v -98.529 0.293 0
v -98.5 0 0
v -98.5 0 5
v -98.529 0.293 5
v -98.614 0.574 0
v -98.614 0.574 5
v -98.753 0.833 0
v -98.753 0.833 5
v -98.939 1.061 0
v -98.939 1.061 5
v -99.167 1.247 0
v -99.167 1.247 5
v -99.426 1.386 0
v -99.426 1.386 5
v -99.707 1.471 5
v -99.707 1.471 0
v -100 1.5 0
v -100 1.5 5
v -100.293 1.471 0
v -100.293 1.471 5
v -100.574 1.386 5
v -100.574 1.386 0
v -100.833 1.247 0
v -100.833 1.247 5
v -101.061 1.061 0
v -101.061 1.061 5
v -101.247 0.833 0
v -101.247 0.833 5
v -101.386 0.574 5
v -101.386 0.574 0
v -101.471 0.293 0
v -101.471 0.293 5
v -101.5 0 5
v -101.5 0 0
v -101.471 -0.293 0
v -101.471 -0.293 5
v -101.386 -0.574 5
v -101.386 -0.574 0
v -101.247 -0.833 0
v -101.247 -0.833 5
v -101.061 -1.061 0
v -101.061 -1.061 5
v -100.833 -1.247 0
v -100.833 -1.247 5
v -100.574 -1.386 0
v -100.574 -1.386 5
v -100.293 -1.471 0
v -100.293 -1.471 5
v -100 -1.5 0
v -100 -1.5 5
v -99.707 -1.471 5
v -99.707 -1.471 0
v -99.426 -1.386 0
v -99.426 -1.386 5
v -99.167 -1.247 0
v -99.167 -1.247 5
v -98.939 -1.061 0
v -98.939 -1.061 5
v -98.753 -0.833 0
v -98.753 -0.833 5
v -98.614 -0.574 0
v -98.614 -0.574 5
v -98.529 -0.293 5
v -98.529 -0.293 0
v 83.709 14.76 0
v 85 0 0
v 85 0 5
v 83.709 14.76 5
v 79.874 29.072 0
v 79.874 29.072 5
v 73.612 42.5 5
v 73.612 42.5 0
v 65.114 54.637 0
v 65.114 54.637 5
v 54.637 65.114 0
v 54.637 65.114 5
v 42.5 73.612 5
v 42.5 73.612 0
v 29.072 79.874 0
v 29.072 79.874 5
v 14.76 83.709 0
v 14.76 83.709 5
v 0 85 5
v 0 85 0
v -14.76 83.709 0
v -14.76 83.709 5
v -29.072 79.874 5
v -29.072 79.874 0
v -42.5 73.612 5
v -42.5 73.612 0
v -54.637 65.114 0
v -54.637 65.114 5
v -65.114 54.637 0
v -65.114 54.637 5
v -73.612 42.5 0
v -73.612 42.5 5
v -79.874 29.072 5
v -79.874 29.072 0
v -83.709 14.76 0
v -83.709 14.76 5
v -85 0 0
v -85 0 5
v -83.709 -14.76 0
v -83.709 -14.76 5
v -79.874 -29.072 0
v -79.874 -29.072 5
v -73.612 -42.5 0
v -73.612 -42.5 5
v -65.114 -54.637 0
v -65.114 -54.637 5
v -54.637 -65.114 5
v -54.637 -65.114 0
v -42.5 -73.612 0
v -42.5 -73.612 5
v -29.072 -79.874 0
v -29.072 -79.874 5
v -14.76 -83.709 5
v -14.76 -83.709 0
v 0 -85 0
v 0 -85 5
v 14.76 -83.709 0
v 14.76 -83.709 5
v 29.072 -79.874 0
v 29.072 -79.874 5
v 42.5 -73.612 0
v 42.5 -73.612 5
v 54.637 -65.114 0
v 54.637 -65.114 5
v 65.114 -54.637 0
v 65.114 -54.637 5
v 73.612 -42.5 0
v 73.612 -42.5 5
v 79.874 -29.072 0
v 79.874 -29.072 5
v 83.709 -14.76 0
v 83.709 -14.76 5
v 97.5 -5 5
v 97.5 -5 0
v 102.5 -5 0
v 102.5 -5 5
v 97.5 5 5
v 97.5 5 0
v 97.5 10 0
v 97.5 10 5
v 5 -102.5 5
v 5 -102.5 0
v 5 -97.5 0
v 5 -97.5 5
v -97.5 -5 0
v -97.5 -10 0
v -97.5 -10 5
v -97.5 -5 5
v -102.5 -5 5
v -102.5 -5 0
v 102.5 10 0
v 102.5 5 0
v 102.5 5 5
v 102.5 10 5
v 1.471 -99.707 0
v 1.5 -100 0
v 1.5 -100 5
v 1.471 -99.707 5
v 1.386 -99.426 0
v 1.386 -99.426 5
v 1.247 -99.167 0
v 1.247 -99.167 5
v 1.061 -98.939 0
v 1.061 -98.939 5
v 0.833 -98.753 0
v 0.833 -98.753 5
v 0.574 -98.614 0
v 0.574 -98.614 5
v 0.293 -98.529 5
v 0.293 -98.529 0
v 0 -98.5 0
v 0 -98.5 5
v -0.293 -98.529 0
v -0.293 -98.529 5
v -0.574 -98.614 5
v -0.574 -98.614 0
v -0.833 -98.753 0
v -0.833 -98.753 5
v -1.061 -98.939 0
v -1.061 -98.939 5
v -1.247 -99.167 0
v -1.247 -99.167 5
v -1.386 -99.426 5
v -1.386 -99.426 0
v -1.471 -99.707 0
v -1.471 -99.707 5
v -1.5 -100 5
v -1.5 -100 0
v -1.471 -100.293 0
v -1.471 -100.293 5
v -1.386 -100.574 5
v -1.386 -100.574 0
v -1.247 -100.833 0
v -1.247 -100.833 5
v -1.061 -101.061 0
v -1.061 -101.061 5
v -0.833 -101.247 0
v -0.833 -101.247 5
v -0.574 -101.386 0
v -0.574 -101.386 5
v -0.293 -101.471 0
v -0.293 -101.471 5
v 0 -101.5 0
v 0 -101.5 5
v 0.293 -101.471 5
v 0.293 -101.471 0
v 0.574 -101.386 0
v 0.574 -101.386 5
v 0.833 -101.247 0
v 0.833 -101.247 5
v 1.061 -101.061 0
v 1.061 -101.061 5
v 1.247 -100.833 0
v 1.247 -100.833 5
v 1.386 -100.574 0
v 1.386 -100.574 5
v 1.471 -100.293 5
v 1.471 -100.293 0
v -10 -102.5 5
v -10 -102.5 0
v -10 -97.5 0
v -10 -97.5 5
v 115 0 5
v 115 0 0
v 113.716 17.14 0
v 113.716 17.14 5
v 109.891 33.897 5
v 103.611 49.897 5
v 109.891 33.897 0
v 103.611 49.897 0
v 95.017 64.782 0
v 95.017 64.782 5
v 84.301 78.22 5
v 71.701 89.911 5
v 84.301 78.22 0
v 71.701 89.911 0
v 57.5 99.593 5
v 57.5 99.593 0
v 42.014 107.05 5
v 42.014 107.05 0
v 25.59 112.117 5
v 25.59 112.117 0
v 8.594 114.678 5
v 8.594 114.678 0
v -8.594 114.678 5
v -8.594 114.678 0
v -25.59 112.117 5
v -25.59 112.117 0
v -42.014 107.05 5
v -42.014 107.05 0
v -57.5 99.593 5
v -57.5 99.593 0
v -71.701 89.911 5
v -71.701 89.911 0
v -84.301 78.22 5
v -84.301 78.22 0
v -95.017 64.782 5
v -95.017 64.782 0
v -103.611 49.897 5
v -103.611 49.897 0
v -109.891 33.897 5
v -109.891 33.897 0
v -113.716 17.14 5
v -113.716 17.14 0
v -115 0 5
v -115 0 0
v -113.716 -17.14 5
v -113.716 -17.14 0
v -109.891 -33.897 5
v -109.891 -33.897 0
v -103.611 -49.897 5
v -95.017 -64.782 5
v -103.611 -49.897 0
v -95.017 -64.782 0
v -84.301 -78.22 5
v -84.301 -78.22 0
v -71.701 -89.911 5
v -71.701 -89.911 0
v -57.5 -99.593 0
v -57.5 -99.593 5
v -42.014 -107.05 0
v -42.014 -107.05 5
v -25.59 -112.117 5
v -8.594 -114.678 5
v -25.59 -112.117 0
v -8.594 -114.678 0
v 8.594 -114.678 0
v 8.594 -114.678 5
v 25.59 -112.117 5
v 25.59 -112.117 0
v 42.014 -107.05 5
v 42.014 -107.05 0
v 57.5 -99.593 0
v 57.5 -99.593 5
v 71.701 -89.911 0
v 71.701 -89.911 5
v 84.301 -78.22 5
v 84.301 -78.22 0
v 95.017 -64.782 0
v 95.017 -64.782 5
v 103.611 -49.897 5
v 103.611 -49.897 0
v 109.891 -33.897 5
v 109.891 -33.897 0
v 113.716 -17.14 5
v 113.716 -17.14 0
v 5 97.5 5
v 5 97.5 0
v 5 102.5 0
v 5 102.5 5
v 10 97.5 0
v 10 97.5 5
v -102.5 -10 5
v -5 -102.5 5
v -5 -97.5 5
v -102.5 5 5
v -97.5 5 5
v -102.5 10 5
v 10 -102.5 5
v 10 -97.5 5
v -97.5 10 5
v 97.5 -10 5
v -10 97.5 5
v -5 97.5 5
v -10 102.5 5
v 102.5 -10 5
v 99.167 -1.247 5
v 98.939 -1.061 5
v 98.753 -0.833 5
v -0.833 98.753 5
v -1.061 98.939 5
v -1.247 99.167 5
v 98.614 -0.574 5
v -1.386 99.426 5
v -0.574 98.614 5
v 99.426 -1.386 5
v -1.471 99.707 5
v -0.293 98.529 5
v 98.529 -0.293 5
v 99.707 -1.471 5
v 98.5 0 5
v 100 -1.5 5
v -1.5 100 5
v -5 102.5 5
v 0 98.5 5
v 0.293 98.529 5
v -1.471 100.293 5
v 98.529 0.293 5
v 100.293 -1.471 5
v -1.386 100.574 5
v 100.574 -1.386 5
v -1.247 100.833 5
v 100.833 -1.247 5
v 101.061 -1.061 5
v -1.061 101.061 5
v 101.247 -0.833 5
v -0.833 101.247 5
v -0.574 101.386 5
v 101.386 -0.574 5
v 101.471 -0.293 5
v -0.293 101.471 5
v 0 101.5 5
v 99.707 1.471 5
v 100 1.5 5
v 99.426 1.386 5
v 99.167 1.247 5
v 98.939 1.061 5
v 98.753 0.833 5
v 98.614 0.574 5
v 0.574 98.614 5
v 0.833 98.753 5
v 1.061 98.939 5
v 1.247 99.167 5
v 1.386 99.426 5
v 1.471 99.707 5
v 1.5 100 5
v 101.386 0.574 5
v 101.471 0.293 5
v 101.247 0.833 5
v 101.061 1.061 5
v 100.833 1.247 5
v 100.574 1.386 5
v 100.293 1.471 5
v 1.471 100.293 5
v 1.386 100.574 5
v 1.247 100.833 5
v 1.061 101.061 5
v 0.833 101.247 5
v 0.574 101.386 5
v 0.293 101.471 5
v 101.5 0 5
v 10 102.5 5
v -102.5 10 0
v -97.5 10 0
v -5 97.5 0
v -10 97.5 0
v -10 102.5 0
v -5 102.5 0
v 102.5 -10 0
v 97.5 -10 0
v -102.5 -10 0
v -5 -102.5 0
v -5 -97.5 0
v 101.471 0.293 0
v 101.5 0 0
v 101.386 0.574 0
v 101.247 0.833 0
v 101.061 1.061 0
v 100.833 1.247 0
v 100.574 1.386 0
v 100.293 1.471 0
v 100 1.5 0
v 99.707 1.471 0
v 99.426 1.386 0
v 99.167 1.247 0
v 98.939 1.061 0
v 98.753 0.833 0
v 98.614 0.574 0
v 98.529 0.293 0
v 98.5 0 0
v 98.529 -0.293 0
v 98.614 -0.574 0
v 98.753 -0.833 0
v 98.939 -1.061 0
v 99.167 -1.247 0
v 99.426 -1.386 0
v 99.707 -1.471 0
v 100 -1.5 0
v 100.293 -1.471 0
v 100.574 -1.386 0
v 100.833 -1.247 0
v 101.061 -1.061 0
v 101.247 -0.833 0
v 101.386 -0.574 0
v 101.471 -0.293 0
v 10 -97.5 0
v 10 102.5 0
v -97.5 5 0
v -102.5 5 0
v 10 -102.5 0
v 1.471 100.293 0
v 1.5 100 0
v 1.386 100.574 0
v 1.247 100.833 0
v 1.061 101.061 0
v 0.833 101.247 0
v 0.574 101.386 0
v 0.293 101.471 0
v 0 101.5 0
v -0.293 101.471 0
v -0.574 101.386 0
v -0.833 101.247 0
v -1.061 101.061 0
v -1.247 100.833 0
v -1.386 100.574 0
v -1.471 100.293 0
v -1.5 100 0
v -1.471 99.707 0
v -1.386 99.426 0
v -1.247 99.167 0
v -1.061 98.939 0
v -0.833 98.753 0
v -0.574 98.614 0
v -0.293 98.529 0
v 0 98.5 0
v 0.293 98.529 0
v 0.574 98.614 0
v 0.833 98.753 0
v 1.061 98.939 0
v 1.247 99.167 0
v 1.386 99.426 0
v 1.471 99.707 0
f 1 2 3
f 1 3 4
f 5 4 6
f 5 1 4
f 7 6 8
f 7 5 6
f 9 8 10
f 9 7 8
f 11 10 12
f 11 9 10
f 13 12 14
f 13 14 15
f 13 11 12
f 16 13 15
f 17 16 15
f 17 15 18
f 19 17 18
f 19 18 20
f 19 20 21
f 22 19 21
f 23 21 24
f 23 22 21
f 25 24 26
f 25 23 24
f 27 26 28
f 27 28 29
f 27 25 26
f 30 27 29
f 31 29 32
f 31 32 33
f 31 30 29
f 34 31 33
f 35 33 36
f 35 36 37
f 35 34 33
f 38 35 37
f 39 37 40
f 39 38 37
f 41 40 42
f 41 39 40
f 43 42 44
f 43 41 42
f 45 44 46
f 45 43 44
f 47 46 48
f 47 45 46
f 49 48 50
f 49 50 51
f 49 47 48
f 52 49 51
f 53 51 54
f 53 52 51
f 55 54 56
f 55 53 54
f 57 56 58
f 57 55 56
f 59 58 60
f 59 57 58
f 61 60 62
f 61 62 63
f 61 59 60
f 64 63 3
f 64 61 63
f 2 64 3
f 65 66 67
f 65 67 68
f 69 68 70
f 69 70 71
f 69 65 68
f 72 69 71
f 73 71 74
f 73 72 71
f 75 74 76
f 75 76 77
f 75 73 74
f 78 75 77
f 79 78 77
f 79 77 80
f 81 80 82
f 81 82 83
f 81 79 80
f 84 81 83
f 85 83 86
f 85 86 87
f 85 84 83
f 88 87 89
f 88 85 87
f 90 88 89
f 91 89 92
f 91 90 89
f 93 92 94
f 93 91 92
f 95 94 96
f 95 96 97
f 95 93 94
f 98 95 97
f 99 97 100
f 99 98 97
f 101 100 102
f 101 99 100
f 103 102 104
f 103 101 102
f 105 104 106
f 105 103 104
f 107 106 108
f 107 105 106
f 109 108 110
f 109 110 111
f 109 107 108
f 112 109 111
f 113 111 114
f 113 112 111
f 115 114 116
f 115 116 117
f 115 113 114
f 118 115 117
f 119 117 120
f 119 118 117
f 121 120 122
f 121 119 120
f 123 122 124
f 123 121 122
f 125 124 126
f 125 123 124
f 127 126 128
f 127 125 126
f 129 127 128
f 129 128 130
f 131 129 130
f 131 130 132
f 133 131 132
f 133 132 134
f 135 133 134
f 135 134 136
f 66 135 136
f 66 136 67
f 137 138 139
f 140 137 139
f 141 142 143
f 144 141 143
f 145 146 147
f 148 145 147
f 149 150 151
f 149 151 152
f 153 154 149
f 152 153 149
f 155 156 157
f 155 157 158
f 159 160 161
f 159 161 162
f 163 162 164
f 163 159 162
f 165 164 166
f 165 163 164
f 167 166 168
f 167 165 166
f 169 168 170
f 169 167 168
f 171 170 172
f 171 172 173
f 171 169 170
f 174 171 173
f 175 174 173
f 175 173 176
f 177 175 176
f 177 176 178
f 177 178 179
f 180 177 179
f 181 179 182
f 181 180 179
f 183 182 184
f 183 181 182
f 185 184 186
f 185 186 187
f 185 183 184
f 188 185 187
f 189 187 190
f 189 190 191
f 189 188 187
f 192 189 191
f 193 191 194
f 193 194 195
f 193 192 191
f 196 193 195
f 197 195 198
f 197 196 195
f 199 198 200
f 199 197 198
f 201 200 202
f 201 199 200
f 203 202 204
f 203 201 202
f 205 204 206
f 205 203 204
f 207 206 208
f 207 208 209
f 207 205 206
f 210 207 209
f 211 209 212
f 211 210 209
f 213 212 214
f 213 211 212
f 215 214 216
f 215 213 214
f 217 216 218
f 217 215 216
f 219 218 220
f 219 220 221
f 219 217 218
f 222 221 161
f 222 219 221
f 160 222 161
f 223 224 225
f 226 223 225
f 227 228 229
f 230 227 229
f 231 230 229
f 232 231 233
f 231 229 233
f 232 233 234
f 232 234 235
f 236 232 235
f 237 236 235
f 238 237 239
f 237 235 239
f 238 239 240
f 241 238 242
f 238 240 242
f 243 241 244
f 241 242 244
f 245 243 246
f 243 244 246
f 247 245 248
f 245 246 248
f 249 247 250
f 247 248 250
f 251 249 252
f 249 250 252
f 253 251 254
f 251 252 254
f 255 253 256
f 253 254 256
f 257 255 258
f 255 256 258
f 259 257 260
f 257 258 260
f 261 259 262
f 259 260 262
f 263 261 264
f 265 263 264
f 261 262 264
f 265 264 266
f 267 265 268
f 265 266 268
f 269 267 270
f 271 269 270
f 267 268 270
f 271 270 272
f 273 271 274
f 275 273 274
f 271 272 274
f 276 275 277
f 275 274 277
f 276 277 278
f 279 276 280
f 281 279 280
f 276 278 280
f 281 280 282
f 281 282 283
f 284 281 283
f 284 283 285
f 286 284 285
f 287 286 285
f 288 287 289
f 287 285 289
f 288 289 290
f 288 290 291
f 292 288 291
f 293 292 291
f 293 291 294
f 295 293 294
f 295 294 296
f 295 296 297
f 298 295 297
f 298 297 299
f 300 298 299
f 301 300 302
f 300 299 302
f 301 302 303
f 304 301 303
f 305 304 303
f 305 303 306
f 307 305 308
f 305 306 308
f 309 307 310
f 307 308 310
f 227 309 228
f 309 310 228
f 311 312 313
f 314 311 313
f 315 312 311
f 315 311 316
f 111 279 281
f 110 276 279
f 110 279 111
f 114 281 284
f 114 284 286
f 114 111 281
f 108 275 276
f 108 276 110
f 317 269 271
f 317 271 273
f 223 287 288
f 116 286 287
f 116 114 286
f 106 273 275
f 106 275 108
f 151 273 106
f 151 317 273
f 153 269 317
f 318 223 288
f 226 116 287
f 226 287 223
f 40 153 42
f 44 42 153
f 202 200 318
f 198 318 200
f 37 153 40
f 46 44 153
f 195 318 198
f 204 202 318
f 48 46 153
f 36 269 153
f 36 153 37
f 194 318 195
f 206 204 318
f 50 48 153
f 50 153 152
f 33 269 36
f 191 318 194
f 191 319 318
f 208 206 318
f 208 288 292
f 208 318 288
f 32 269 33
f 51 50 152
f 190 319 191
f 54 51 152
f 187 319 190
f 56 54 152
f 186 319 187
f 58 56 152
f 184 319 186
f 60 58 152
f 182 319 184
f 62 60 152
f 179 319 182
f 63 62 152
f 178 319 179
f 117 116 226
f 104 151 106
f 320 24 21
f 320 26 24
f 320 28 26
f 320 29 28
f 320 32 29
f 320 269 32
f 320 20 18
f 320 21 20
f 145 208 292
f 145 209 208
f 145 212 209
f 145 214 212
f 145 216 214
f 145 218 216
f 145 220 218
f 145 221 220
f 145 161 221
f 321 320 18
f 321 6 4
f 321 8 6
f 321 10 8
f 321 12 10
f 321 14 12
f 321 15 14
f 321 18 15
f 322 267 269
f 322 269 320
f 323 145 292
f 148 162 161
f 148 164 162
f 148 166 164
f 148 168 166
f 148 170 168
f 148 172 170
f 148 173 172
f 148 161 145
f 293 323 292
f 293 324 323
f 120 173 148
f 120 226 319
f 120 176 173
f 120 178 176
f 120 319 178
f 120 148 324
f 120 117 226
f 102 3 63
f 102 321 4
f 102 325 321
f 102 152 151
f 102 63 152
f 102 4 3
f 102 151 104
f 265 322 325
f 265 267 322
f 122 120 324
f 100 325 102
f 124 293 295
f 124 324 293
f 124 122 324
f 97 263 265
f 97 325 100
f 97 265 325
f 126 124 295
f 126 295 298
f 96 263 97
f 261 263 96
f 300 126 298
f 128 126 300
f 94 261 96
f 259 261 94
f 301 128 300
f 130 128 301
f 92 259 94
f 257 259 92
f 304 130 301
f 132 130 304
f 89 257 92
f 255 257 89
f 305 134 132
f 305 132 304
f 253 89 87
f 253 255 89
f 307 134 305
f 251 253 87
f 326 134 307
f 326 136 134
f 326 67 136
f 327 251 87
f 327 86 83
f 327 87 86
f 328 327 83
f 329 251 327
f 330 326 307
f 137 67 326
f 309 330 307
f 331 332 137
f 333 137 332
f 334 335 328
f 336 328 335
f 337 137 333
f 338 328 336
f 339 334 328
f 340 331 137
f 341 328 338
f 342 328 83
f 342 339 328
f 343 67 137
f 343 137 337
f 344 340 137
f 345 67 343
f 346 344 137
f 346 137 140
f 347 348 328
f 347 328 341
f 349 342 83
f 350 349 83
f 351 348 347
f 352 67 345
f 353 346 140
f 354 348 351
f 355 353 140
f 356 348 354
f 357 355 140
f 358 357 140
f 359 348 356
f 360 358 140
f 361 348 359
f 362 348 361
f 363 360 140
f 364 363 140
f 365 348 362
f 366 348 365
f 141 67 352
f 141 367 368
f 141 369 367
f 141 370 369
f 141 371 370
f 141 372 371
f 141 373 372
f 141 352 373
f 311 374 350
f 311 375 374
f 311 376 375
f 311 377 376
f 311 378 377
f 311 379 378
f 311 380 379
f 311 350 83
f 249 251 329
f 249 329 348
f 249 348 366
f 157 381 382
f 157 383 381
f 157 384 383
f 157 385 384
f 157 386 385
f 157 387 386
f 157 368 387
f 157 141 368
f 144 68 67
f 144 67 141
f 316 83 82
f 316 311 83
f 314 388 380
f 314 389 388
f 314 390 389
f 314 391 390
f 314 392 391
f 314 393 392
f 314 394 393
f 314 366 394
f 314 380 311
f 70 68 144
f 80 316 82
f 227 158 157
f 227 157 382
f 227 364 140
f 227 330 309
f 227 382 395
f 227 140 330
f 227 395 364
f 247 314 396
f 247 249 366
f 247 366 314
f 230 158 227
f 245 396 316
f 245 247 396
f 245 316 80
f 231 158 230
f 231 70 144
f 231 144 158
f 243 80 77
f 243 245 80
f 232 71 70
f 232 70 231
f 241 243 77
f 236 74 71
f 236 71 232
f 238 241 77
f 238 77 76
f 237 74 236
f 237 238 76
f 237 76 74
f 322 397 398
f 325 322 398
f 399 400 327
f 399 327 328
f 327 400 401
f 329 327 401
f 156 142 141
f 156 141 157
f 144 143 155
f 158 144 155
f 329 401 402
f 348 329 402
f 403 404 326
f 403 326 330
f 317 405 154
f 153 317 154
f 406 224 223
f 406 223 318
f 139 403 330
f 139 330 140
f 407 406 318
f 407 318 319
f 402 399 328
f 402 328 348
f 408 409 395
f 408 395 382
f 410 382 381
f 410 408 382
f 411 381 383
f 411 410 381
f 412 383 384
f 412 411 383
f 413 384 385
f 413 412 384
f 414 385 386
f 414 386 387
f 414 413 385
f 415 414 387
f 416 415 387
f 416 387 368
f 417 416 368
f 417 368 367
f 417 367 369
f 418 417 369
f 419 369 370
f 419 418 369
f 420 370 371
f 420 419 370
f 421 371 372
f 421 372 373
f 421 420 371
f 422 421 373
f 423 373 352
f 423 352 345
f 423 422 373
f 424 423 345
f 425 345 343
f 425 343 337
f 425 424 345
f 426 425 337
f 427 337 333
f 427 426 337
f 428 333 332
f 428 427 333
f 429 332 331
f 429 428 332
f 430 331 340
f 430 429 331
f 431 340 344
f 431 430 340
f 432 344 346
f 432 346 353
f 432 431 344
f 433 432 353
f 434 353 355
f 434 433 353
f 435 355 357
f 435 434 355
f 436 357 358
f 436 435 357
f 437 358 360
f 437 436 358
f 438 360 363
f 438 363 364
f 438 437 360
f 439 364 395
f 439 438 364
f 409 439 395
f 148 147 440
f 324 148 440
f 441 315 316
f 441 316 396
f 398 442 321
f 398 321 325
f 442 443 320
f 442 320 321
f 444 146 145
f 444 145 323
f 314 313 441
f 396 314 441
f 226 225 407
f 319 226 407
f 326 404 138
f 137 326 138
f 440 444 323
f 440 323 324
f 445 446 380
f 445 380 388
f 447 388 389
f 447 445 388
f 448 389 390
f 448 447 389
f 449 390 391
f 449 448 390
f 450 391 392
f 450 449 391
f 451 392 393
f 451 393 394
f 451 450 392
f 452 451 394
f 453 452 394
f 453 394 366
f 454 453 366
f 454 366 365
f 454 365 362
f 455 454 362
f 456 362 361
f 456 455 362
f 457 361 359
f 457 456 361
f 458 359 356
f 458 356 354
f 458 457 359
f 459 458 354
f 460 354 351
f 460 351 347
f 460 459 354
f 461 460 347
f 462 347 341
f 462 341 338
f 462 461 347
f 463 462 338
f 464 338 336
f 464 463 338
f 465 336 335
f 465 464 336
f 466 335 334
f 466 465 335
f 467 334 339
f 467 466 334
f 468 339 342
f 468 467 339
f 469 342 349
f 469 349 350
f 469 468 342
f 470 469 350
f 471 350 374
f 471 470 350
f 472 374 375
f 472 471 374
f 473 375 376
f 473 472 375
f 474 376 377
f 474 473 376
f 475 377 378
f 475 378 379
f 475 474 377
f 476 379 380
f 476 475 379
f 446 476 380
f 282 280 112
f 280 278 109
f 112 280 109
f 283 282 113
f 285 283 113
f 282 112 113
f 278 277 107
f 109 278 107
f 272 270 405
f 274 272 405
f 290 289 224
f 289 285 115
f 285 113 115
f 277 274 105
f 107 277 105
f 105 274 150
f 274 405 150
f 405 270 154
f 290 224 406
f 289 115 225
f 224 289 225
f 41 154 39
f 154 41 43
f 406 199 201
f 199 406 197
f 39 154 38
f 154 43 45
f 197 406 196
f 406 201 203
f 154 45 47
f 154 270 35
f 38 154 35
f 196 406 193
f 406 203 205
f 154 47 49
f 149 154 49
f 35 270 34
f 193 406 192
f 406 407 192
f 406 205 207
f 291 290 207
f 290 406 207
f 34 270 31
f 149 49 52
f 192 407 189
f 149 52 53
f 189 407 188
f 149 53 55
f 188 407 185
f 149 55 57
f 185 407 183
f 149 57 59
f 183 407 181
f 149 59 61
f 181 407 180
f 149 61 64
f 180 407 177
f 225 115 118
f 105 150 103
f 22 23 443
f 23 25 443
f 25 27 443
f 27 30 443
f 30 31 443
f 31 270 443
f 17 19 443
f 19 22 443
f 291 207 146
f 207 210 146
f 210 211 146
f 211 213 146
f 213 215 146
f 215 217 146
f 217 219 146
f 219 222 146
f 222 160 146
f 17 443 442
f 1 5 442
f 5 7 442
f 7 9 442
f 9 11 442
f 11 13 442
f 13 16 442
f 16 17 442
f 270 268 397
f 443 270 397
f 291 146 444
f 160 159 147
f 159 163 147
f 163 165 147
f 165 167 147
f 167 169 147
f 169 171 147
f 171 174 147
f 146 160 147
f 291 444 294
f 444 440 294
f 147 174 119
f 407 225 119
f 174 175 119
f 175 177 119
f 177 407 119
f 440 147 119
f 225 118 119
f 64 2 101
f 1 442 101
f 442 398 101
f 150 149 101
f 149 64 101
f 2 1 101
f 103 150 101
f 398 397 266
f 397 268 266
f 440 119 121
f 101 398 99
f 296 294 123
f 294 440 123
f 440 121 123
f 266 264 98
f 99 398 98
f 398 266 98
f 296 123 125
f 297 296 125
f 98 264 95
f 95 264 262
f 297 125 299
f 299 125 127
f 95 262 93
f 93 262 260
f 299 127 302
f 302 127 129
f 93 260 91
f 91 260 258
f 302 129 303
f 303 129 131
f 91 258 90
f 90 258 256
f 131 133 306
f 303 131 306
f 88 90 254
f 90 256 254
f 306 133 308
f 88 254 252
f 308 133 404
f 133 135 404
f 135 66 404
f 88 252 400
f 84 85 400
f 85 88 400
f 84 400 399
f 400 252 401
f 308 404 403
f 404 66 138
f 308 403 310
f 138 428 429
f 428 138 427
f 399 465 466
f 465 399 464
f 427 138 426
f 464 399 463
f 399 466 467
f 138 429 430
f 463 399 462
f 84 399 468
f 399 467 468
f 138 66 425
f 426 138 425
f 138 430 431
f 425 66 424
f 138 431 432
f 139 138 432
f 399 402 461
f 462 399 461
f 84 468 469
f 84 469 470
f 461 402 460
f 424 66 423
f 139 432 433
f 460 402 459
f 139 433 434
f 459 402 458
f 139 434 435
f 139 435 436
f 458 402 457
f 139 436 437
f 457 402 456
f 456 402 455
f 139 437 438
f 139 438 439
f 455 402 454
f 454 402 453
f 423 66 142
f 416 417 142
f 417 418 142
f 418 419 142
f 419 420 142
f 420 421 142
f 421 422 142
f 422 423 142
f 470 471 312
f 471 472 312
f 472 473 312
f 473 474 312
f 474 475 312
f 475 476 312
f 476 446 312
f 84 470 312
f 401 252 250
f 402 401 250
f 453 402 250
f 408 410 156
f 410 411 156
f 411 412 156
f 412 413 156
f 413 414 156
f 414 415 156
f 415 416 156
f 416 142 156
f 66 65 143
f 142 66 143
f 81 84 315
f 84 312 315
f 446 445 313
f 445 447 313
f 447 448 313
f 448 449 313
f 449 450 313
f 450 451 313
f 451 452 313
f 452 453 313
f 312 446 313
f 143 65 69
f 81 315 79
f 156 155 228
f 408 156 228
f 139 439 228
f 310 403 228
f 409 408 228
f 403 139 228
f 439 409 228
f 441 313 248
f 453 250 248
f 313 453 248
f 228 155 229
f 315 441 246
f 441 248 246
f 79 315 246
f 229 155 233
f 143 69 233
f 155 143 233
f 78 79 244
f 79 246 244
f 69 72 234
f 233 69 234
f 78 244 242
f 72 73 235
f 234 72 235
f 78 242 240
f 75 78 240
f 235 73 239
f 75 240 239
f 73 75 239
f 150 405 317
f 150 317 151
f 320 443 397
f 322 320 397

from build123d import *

# Parameters (mm, degrees)
ESQUISSE1_R        = 115
ESQUISSE1_R_2      = 85
ESQUISSE1_R_3      = 1.5
ESQUISSE1_W        = 5
ESQUISSE1_H        = 5
BOSS_EXTRU_1_DEPTH = 5


with BuildPart() as part:
    # Esquisse1 → Boss.-Extru.1 (new body)
    with BuildSketch(Plane.XY):
        Circle(ESQUISSE1_R)
        Circle(ESQUISSE1_R_2, mode=Mode.SUBTRACT)
        with Locations((-100, 0)):
            Circle(ESQUISSE1_R_3, mode=Mode.SUBTRACT)
        with Locations((0, 100)):
            Circle(ESQUISSE1_R_3, mode=Mode.SUBTRACT)
        with Locations((100, 0)):
            Circle(ESQUISSE1_R_3, mode=Mode.SUBTRACT)
        with Locations((0, -100)):
            Circle(ESQUISSE1_R_3, mode=Mode.SUBTRACT)
        with Locations((-100, -7.5)):
            Rectangle(ESQUISSE1_W, ESQUISSE1_H, mode=Mode.SUBTRACT)
        with Locations((-100, 7.5)):
            Rectangle(ESQUISSE1_W, ESQUISSE1_H, mode=Mode.SUBTRACT)
        with Locations((-7.5, 100)):
            Rectangle(ESQUISSE1_W, ESQUISSE1_H, mode=Mode.SUBTRACT)
        with Locations((7.5, 100)):
            Rectangle(ESQUISSE1_W, ESQUISSE1_H, mode=Mode.SUBTRACT)
        with Locations((100, 7.5)):
            Rectangle(ESQUISSE1_W, ESQUISSE1_H, mode=Mode.SUBTRACT)
        with Locations((100, -7.5)):
            Rectangle(ESQUISSE1_W, ESQUISSE1_H, mode=Mode.SUBTRACT)
        with Locations((7.5, -100)):
            Rectangle(ESQUISSE1_W, ESQUISSE1_H, mode=Mode.SUBTRACT)
        with Locations((-7.5, -100)):
            Rectangle(ESQUISSE1_W, ESQUISSE1_H, mode=Mode.SUBTRACT)
    extrude(amount=BOSS_EXTRU_1_DEPTH)


solid = part.part
